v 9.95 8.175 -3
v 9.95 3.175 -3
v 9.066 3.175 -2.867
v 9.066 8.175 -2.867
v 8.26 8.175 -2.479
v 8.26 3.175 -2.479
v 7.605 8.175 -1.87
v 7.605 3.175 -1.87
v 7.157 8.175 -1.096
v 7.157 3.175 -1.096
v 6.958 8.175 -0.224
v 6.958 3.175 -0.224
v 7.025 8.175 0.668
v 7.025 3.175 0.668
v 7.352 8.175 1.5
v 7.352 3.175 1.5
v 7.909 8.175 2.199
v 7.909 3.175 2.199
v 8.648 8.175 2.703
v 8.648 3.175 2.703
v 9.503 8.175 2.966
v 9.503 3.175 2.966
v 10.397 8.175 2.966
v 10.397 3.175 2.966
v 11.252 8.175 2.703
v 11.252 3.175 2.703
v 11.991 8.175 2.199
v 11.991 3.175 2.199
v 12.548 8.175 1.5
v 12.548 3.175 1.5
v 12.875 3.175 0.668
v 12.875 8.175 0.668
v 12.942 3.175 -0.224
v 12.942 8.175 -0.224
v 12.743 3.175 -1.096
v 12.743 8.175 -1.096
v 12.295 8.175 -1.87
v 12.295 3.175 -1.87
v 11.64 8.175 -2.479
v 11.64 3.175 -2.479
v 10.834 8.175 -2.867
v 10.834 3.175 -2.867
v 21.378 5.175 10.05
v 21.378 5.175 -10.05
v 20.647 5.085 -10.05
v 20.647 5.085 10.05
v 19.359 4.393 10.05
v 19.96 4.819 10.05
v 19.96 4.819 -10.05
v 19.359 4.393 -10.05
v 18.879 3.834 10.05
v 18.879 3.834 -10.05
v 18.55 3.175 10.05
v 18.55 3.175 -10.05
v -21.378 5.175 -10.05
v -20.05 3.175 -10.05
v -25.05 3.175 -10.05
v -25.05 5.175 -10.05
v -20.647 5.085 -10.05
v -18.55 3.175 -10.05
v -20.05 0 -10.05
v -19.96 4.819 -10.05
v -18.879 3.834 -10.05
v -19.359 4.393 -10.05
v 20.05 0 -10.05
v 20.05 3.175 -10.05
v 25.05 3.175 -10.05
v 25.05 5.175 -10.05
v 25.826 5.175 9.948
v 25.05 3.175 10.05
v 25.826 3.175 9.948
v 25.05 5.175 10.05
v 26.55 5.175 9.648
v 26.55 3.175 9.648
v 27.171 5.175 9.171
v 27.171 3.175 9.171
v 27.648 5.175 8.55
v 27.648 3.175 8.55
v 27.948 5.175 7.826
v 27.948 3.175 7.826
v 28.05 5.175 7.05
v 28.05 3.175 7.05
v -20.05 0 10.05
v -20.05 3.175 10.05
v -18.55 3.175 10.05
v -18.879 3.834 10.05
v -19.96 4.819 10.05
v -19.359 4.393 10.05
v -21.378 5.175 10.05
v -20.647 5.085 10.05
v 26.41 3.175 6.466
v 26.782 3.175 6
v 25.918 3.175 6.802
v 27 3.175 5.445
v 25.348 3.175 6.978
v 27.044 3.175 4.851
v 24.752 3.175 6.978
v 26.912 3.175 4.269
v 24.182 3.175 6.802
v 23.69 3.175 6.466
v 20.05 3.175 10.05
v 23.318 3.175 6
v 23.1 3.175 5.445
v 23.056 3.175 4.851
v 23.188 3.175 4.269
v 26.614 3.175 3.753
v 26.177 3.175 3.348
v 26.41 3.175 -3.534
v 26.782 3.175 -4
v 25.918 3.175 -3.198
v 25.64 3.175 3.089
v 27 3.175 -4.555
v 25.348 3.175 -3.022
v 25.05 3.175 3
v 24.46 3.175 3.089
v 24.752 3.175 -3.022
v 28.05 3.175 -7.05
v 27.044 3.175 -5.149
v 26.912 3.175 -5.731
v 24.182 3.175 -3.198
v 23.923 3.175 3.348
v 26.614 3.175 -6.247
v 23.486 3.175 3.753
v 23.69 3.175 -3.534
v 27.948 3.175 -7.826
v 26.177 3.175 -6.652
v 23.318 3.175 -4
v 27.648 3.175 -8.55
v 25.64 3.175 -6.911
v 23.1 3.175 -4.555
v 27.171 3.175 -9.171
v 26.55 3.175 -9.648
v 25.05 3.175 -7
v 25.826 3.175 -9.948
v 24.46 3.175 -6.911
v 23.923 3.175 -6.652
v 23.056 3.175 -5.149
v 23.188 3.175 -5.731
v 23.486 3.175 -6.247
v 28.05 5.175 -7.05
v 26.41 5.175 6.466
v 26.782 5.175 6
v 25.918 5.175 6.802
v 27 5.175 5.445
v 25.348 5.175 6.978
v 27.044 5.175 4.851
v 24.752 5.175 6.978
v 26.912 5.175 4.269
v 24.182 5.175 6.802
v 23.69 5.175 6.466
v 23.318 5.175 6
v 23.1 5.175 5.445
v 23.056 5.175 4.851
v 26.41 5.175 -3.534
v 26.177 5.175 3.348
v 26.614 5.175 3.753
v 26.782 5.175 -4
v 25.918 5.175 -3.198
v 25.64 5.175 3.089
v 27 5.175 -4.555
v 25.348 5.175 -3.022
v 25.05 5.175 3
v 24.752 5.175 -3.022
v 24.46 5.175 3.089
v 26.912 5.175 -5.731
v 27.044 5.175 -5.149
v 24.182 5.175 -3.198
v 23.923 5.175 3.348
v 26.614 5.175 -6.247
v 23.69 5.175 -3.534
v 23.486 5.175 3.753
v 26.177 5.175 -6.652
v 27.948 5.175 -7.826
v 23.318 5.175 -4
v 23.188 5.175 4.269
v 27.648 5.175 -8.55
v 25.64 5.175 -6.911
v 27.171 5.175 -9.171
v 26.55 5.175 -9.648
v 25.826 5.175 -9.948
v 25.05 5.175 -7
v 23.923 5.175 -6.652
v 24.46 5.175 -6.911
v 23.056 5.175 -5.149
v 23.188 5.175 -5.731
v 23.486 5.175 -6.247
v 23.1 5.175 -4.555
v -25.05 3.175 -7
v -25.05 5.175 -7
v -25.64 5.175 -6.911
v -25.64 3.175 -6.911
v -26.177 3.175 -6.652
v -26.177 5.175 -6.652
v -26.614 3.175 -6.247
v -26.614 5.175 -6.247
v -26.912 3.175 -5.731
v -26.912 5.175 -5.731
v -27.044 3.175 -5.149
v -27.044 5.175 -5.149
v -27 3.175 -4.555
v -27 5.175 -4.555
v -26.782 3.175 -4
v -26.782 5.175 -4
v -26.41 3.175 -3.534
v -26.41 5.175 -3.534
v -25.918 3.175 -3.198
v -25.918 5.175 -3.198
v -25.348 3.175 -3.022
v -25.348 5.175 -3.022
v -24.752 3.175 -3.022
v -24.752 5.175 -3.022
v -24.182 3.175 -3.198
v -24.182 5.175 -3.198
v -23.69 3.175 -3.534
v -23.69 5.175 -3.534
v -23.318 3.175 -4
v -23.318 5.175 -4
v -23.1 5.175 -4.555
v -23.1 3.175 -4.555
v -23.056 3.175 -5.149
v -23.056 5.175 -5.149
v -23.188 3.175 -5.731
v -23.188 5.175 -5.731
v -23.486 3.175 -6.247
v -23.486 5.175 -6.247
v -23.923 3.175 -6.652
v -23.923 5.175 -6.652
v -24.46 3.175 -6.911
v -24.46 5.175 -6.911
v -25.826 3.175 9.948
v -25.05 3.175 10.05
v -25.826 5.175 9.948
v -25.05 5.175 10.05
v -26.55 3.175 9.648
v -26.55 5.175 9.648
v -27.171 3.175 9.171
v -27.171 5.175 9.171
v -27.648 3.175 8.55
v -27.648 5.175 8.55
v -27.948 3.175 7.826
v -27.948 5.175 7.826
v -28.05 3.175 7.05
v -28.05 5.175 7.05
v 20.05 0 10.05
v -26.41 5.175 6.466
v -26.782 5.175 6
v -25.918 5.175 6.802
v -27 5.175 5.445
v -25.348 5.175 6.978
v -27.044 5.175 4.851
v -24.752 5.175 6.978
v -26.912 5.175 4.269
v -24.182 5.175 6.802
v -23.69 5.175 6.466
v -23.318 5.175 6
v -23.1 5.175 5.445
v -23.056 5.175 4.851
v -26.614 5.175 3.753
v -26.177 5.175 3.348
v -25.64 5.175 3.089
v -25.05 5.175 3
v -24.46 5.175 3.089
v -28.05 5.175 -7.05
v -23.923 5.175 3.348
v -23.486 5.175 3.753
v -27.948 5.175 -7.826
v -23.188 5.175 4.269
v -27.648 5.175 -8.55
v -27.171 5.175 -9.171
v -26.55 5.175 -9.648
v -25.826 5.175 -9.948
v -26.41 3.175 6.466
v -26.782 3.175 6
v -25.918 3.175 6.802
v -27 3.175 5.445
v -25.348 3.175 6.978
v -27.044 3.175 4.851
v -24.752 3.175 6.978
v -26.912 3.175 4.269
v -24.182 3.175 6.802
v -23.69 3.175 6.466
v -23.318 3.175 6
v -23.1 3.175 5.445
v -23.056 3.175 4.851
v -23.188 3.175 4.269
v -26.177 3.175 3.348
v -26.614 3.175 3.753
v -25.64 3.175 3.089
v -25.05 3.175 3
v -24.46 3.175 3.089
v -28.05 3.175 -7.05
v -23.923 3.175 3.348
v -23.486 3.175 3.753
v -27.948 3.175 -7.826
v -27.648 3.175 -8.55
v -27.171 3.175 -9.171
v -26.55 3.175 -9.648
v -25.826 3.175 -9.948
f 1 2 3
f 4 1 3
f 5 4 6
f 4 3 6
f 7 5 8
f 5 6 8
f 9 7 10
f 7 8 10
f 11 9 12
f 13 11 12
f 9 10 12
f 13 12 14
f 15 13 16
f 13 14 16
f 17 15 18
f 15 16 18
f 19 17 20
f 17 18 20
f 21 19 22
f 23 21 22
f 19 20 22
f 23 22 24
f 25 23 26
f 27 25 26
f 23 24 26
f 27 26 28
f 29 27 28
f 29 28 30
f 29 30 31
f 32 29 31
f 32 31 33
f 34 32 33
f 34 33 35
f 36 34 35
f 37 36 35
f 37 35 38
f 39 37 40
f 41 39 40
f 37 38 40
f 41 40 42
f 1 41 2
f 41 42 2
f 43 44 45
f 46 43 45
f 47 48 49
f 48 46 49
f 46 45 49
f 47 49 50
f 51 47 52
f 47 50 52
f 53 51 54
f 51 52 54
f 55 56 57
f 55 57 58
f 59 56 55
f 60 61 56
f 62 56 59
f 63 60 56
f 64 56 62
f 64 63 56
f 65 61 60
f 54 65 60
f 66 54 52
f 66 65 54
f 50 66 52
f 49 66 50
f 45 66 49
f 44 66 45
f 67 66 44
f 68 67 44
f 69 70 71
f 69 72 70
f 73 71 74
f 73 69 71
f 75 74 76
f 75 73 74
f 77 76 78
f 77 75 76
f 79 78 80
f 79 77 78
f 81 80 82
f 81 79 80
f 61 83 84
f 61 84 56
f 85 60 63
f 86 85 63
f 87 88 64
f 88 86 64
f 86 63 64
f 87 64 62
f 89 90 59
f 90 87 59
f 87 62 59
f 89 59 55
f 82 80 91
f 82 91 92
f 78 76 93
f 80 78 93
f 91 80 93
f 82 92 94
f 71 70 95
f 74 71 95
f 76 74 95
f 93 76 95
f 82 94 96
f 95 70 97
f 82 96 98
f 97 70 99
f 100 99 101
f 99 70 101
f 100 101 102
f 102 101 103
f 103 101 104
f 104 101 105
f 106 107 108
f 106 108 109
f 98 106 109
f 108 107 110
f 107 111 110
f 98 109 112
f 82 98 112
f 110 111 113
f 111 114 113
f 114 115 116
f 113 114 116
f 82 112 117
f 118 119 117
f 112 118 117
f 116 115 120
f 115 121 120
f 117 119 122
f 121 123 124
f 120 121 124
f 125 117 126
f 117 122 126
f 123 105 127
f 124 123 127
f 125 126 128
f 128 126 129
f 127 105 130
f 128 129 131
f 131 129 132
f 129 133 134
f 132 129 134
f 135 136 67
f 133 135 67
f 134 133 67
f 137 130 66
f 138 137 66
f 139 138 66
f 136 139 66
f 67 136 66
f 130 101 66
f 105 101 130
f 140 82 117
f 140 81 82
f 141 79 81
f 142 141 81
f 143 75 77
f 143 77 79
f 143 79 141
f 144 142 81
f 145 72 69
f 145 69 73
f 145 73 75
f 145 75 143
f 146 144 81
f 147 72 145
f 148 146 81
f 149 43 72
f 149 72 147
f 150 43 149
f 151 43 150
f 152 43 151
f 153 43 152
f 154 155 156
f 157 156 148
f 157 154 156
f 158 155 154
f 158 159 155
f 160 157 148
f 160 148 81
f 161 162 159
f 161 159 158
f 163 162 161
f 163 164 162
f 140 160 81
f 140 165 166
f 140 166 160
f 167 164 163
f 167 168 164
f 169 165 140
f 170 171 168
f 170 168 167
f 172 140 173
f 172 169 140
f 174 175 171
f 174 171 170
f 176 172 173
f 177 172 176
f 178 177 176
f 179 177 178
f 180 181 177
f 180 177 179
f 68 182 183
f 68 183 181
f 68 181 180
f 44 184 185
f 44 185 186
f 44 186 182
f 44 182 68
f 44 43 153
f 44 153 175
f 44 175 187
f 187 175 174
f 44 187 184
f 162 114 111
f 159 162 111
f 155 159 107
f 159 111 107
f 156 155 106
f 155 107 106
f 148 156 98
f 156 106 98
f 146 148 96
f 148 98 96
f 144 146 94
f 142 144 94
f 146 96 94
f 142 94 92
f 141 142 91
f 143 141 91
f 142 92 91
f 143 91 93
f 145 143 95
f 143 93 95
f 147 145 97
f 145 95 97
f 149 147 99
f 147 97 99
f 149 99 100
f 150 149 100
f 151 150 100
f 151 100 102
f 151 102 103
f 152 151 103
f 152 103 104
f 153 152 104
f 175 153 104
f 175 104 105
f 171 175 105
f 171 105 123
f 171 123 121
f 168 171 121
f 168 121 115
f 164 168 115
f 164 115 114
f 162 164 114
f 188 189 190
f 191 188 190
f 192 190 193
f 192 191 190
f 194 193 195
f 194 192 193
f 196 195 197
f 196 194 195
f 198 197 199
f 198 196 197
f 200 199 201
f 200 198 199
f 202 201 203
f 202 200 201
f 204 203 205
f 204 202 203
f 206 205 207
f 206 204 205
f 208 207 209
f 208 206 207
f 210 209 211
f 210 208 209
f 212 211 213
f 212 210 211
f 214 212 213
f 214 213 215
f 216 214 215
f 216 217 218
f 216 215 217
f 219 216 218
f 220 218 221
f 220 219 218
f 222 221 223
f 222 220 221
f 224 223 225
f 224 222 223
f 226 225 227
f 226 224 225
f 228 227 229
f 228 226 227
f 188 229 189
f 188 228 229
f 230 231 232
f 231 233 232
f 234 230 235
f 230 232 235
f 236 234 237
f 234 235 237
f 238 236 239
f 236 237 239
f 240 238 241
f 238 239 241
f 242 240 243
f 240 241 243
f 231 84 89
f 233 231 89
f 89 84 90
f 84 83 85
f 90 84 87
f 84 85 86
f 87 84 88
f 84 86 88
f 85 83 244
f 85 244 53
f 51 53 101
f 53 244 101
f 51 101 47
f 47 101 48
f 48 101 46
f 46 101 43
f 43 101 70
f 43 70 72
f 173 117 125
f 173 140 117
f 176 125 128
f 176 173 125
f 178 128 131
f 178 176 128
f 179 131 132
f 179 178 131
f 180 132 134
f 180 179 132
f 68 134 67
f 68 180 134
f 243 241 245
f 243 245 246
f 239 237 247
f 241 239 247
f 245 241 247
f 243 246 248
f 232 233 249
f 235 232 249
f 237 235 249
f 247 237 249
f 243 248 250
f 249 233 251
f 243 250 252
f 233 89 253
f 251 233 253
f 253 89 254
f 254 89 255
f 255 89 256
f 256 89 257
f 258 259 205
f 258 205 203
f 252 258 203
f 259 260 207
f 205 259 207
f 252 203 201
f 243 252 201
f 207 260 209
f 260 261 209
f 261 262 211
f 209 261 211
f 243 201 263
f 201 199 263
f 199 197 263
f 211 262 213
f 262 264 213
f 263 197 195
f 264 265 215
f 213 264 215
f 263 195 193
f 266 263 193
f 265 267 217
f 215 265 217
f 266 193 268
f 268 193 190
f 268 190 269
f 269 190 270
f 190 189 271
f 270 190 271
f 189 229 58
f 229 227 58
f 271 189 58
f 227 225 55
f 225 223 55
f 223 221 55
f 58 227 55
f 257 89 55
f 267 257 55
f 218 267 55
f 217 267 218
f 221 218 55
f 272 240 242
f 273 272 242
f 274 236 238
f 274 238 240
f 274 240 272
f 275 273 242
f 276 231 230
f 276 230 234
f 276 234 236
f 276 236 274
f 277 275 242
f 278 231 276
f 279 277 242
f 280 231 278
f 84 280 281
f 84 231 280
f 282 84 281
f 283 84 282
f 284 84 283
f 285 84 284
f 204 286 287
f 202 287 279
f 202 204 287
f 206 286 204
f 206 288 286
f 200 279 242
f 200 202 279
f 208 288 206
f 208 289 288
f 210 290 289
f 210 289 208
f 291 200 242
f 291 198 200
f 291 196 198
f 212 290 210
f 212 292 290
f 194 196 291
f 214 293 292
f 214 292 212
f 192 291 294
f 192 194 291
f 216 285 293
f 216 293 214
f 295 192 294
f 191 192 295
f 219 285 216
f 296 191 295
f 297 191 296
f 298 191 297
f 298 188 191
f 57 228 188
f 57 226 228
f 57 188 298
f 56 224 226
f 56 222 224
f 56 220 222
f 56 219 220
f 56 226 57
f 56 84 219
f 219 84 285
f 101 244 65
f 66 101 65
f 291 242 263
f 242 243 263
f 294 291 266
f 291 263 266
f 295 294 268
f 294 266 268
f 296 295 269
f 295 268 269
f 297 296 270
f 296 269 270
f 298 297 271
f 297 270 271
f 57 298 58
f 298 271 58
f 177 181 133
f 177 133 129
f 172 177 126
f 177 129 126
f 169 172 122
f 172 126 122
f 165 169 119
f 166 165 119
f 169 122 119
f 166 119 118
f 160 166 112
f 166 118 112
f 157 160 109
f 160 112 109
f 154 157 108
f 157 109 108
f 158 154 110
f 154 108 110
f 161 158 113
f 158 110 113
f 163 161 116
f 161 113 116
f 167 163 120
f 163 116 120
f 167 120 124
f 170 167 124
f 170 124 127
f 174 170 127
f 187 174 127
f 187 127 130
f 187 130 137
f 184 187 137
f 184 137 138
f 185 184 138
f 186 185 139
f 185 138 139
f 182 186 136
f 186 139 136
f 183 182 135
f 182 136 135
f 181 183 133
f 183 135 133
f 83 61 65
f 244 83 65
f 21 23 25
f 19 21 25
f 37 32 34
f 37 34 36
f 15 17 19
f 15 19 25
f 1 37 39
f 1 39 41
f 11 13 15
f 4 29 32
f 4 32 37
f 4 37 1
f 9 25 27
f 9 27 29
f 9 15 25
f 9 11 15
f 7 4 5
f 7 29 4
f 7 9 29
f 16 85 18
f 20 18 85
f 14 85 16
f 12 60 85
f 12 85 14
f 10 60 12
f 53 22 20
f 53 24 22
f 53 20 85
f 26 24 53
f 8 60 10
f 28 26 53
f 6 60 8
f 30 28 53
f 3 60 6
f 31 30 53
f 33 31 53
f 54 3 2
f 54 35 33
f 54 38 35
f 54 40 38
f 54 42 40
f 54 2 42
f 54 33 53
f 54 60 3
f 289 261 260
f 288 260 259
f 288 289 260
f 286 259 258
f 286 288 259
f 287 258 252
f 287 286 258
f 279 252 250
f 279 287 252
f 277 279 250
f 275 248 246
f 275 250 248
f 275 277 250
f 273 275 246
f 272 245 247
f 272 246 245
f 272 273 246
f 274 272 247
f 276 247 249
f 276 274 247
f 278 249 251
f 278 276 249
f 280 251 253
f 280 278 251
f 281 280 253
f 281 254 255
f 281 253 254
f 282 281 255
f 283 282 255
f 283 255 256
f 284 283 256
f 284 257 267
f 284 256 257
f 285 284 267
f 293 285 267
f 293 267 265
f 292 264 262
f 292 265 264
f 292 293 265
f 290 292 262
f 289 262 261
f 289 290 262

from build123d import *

# Parameters (mm, degrees)
SKETCH1_W            = 40.1
SKETCH1_H            = 20.1
BOSS_EXTRUDE1_DEPTH  = 3.175
SKETCH2_W            = 1.5
SKETCH2_H            = 20.1
BOSS_EXTRUDE2_DEPTH  = 2
SKETCH3_W            = 20.1
SKETCH3_H            = 2
BOSS_EXTRUDE3_DEPTH  = 8
SKETCH4_R            = 2
CUT_EXTRUDE1_DEPTH   = 30.964739695
FILLET1_R            = 3
FILLET2_R            = 3
FILLET1_OF_MIRROR2_R = 3
FILLET2_OF_MIRROR2_R = 3
SKETCH5_R            = 3
BOSS_EXTRUDE4_DEPTH  = 5


with BuildPart() as part:
    # Sketch1 → Boss-Extrude1 (new body)
    with BuildSketch(Plane(origin=(0, 0, 0), x_dir=(1, 0, 0), z_dir=(0, 1, 0))):
        Rectangle(SKETCH1_W, SKETCH1_H)
    extrude(amount=BOSS_EXTRUDE1_DEPTH)

    # Sketch2 → Boss-Extrude2 (add)
    with BuildSketch(Plane(origin=(0, 3.175, 0), x_dir=(1, 0, 0), z_dir=(0, 1, 0))):
        with Locations((19.3, 0)):
            Rectangle(SKETCH2_W, SKETCH2_H)
    boss_extrude2 = extrude(amount=BOSS_EXTRUDE2_DEPTH)

    # Sketch3 → Boss-Extrude3 (add)
    with BuildSketch(Plane(origin=(20.05, 0, 0), x_dir=(0, 0, -1), z_dir=(1, 0, 0))):
        with Locations((0, 4.175)):
            Rectangle(SKETCH3_W, SKETCH3_H)
    boss_extrude3 = extrude(amount=BOSS_EXTRUDE3_DEPTH)

    # Sketch4 → Cut-Extrude1 (cut, symmetric)
    with BuildSketch(Plane.XZ.offset(-3.175)):
        with Locations(Location((25.05, 5, 0), (0, 0, 270))):
            Circle(SKETCH4_R)
        with Locations(Location((25.05, -5, 0), (0, 0, 270))):
            Circle(SKETCH4_R)
    cut_extrude1 = extrude(amount=CUT_EXTRUDE1_DEPTH, both=True, mode=Mode.SUBTRACT)

    # Fillet1
    # the kernel refuses this fillet: 3 mm, written as the material it takes off along each edge
    with BuildSketch(Plane(origin=(18.55, 5.175, -17.121067812), x_dir=(0, -1, 0), z_dir=(0, 0, 1))) as fillet1_piece_1:
        with BuildLine():
            CenterArc((3, 2.828427125), FILLET1_R, 180, 70.528779366)
            Line((0, 2.828427125), (-0.06, 2.828427125))
            Line((-0.06, 2.828427125), (-0.06, 0))
            Line((-0.06, 0), (0, -0.06))
            ThreePointArc((0, -0.06), (1, -0.06), (1.98, -0.056568542))
            Line((1.98, -0.056568542), (2, 0))
        make_face()
    extrude(amount=34.242135624, mode=Mode.SUBTRACT)

    # Fillet2
    fillet2_edges = [part.edges().sort_by_distance(p)[0] for p in [
        (28.05, 4.175, 10.05),
        (28.05, 4.175, -10.05),
    ]]
    fillet(fillet2_edges, radius=FILLET2_R)

    # Mirror2: Boss-Extrude2, Boss-Extrude3, Cut-Extrude1 across plane
    add(boss_extrude2.mirror(Plane(origin=(0, 0, 0), x_dir=(0, 0, 1), z_dir=(1, 0, 0))))
    add(boss_extrude3.mirror(Plane(origin=(0, 0, 0), x_dir=(0, 0, 1), z_dir=(1, 0, 0))))
    add(cut_extrude1.mirror(Plane(origin=(0, 0, 0), x_dir=(0, 0, 1), z_dir=(1, 0, 0))), mode=Mode.SUBTRACT)

    # Fillet1 of Mirror2
    # the kernel refuses this fillet: 3 mm, written as the material it takes off along each edge
    with BuildSketch(Plane(origin=(-18.55, 5.175, -17.121067812), x_dir=(-1, 0, 0), z_dir=(0, 0, 1))) as fillet1_of_mirror2_piece_1:
        with BuildLine():
            CenterArc((2.828427125, 3), FILLET1_OF_MIRROR2_R, 199.471220634, 70.528779366)
            Line((0, 2), (-0.056568542, 1.98))
            ThreePointArc((-0.056568542, 1.98), (-0.06, 1), (-0.06, 0))
            Line((-0.06, 0), (0, -0.06))
            Line((0, -0.06), (2.828427125, -0.06))
            Line((2.828427125, -0.06), (2.828427125, 0))
        make_face()
    extrude(amount=34.242135624, mode=Mode.SUBTRACT)

    # Fillet2 of Mirror2
    fillet2_of_mirror2_edges = [part.edges().sort_by_distance(p)[0] for p in [
        (-28.05, 4.175, 10.05),
        (-28.05, 4.175, -10.05),
    ]]
    fillet(fillet2_of_mirror2_edges, radius=FILLET2_OF_MIRROR2_R)

    # Sketch5 → Boss-Extrude4 (add)
    with BuildSketch(Plane(origin=(0, 3.175, 0), x_dir=(1, 0, 0), z_dir=(0, 1, 0))):
        with Locations(Location((9.95, 0, 0), (0, 0, 90))):
            Circle(SKETCH5_R)
    extrude(amount=BOSS_EXTRUDE4_DEPTH)


solid = part.part
